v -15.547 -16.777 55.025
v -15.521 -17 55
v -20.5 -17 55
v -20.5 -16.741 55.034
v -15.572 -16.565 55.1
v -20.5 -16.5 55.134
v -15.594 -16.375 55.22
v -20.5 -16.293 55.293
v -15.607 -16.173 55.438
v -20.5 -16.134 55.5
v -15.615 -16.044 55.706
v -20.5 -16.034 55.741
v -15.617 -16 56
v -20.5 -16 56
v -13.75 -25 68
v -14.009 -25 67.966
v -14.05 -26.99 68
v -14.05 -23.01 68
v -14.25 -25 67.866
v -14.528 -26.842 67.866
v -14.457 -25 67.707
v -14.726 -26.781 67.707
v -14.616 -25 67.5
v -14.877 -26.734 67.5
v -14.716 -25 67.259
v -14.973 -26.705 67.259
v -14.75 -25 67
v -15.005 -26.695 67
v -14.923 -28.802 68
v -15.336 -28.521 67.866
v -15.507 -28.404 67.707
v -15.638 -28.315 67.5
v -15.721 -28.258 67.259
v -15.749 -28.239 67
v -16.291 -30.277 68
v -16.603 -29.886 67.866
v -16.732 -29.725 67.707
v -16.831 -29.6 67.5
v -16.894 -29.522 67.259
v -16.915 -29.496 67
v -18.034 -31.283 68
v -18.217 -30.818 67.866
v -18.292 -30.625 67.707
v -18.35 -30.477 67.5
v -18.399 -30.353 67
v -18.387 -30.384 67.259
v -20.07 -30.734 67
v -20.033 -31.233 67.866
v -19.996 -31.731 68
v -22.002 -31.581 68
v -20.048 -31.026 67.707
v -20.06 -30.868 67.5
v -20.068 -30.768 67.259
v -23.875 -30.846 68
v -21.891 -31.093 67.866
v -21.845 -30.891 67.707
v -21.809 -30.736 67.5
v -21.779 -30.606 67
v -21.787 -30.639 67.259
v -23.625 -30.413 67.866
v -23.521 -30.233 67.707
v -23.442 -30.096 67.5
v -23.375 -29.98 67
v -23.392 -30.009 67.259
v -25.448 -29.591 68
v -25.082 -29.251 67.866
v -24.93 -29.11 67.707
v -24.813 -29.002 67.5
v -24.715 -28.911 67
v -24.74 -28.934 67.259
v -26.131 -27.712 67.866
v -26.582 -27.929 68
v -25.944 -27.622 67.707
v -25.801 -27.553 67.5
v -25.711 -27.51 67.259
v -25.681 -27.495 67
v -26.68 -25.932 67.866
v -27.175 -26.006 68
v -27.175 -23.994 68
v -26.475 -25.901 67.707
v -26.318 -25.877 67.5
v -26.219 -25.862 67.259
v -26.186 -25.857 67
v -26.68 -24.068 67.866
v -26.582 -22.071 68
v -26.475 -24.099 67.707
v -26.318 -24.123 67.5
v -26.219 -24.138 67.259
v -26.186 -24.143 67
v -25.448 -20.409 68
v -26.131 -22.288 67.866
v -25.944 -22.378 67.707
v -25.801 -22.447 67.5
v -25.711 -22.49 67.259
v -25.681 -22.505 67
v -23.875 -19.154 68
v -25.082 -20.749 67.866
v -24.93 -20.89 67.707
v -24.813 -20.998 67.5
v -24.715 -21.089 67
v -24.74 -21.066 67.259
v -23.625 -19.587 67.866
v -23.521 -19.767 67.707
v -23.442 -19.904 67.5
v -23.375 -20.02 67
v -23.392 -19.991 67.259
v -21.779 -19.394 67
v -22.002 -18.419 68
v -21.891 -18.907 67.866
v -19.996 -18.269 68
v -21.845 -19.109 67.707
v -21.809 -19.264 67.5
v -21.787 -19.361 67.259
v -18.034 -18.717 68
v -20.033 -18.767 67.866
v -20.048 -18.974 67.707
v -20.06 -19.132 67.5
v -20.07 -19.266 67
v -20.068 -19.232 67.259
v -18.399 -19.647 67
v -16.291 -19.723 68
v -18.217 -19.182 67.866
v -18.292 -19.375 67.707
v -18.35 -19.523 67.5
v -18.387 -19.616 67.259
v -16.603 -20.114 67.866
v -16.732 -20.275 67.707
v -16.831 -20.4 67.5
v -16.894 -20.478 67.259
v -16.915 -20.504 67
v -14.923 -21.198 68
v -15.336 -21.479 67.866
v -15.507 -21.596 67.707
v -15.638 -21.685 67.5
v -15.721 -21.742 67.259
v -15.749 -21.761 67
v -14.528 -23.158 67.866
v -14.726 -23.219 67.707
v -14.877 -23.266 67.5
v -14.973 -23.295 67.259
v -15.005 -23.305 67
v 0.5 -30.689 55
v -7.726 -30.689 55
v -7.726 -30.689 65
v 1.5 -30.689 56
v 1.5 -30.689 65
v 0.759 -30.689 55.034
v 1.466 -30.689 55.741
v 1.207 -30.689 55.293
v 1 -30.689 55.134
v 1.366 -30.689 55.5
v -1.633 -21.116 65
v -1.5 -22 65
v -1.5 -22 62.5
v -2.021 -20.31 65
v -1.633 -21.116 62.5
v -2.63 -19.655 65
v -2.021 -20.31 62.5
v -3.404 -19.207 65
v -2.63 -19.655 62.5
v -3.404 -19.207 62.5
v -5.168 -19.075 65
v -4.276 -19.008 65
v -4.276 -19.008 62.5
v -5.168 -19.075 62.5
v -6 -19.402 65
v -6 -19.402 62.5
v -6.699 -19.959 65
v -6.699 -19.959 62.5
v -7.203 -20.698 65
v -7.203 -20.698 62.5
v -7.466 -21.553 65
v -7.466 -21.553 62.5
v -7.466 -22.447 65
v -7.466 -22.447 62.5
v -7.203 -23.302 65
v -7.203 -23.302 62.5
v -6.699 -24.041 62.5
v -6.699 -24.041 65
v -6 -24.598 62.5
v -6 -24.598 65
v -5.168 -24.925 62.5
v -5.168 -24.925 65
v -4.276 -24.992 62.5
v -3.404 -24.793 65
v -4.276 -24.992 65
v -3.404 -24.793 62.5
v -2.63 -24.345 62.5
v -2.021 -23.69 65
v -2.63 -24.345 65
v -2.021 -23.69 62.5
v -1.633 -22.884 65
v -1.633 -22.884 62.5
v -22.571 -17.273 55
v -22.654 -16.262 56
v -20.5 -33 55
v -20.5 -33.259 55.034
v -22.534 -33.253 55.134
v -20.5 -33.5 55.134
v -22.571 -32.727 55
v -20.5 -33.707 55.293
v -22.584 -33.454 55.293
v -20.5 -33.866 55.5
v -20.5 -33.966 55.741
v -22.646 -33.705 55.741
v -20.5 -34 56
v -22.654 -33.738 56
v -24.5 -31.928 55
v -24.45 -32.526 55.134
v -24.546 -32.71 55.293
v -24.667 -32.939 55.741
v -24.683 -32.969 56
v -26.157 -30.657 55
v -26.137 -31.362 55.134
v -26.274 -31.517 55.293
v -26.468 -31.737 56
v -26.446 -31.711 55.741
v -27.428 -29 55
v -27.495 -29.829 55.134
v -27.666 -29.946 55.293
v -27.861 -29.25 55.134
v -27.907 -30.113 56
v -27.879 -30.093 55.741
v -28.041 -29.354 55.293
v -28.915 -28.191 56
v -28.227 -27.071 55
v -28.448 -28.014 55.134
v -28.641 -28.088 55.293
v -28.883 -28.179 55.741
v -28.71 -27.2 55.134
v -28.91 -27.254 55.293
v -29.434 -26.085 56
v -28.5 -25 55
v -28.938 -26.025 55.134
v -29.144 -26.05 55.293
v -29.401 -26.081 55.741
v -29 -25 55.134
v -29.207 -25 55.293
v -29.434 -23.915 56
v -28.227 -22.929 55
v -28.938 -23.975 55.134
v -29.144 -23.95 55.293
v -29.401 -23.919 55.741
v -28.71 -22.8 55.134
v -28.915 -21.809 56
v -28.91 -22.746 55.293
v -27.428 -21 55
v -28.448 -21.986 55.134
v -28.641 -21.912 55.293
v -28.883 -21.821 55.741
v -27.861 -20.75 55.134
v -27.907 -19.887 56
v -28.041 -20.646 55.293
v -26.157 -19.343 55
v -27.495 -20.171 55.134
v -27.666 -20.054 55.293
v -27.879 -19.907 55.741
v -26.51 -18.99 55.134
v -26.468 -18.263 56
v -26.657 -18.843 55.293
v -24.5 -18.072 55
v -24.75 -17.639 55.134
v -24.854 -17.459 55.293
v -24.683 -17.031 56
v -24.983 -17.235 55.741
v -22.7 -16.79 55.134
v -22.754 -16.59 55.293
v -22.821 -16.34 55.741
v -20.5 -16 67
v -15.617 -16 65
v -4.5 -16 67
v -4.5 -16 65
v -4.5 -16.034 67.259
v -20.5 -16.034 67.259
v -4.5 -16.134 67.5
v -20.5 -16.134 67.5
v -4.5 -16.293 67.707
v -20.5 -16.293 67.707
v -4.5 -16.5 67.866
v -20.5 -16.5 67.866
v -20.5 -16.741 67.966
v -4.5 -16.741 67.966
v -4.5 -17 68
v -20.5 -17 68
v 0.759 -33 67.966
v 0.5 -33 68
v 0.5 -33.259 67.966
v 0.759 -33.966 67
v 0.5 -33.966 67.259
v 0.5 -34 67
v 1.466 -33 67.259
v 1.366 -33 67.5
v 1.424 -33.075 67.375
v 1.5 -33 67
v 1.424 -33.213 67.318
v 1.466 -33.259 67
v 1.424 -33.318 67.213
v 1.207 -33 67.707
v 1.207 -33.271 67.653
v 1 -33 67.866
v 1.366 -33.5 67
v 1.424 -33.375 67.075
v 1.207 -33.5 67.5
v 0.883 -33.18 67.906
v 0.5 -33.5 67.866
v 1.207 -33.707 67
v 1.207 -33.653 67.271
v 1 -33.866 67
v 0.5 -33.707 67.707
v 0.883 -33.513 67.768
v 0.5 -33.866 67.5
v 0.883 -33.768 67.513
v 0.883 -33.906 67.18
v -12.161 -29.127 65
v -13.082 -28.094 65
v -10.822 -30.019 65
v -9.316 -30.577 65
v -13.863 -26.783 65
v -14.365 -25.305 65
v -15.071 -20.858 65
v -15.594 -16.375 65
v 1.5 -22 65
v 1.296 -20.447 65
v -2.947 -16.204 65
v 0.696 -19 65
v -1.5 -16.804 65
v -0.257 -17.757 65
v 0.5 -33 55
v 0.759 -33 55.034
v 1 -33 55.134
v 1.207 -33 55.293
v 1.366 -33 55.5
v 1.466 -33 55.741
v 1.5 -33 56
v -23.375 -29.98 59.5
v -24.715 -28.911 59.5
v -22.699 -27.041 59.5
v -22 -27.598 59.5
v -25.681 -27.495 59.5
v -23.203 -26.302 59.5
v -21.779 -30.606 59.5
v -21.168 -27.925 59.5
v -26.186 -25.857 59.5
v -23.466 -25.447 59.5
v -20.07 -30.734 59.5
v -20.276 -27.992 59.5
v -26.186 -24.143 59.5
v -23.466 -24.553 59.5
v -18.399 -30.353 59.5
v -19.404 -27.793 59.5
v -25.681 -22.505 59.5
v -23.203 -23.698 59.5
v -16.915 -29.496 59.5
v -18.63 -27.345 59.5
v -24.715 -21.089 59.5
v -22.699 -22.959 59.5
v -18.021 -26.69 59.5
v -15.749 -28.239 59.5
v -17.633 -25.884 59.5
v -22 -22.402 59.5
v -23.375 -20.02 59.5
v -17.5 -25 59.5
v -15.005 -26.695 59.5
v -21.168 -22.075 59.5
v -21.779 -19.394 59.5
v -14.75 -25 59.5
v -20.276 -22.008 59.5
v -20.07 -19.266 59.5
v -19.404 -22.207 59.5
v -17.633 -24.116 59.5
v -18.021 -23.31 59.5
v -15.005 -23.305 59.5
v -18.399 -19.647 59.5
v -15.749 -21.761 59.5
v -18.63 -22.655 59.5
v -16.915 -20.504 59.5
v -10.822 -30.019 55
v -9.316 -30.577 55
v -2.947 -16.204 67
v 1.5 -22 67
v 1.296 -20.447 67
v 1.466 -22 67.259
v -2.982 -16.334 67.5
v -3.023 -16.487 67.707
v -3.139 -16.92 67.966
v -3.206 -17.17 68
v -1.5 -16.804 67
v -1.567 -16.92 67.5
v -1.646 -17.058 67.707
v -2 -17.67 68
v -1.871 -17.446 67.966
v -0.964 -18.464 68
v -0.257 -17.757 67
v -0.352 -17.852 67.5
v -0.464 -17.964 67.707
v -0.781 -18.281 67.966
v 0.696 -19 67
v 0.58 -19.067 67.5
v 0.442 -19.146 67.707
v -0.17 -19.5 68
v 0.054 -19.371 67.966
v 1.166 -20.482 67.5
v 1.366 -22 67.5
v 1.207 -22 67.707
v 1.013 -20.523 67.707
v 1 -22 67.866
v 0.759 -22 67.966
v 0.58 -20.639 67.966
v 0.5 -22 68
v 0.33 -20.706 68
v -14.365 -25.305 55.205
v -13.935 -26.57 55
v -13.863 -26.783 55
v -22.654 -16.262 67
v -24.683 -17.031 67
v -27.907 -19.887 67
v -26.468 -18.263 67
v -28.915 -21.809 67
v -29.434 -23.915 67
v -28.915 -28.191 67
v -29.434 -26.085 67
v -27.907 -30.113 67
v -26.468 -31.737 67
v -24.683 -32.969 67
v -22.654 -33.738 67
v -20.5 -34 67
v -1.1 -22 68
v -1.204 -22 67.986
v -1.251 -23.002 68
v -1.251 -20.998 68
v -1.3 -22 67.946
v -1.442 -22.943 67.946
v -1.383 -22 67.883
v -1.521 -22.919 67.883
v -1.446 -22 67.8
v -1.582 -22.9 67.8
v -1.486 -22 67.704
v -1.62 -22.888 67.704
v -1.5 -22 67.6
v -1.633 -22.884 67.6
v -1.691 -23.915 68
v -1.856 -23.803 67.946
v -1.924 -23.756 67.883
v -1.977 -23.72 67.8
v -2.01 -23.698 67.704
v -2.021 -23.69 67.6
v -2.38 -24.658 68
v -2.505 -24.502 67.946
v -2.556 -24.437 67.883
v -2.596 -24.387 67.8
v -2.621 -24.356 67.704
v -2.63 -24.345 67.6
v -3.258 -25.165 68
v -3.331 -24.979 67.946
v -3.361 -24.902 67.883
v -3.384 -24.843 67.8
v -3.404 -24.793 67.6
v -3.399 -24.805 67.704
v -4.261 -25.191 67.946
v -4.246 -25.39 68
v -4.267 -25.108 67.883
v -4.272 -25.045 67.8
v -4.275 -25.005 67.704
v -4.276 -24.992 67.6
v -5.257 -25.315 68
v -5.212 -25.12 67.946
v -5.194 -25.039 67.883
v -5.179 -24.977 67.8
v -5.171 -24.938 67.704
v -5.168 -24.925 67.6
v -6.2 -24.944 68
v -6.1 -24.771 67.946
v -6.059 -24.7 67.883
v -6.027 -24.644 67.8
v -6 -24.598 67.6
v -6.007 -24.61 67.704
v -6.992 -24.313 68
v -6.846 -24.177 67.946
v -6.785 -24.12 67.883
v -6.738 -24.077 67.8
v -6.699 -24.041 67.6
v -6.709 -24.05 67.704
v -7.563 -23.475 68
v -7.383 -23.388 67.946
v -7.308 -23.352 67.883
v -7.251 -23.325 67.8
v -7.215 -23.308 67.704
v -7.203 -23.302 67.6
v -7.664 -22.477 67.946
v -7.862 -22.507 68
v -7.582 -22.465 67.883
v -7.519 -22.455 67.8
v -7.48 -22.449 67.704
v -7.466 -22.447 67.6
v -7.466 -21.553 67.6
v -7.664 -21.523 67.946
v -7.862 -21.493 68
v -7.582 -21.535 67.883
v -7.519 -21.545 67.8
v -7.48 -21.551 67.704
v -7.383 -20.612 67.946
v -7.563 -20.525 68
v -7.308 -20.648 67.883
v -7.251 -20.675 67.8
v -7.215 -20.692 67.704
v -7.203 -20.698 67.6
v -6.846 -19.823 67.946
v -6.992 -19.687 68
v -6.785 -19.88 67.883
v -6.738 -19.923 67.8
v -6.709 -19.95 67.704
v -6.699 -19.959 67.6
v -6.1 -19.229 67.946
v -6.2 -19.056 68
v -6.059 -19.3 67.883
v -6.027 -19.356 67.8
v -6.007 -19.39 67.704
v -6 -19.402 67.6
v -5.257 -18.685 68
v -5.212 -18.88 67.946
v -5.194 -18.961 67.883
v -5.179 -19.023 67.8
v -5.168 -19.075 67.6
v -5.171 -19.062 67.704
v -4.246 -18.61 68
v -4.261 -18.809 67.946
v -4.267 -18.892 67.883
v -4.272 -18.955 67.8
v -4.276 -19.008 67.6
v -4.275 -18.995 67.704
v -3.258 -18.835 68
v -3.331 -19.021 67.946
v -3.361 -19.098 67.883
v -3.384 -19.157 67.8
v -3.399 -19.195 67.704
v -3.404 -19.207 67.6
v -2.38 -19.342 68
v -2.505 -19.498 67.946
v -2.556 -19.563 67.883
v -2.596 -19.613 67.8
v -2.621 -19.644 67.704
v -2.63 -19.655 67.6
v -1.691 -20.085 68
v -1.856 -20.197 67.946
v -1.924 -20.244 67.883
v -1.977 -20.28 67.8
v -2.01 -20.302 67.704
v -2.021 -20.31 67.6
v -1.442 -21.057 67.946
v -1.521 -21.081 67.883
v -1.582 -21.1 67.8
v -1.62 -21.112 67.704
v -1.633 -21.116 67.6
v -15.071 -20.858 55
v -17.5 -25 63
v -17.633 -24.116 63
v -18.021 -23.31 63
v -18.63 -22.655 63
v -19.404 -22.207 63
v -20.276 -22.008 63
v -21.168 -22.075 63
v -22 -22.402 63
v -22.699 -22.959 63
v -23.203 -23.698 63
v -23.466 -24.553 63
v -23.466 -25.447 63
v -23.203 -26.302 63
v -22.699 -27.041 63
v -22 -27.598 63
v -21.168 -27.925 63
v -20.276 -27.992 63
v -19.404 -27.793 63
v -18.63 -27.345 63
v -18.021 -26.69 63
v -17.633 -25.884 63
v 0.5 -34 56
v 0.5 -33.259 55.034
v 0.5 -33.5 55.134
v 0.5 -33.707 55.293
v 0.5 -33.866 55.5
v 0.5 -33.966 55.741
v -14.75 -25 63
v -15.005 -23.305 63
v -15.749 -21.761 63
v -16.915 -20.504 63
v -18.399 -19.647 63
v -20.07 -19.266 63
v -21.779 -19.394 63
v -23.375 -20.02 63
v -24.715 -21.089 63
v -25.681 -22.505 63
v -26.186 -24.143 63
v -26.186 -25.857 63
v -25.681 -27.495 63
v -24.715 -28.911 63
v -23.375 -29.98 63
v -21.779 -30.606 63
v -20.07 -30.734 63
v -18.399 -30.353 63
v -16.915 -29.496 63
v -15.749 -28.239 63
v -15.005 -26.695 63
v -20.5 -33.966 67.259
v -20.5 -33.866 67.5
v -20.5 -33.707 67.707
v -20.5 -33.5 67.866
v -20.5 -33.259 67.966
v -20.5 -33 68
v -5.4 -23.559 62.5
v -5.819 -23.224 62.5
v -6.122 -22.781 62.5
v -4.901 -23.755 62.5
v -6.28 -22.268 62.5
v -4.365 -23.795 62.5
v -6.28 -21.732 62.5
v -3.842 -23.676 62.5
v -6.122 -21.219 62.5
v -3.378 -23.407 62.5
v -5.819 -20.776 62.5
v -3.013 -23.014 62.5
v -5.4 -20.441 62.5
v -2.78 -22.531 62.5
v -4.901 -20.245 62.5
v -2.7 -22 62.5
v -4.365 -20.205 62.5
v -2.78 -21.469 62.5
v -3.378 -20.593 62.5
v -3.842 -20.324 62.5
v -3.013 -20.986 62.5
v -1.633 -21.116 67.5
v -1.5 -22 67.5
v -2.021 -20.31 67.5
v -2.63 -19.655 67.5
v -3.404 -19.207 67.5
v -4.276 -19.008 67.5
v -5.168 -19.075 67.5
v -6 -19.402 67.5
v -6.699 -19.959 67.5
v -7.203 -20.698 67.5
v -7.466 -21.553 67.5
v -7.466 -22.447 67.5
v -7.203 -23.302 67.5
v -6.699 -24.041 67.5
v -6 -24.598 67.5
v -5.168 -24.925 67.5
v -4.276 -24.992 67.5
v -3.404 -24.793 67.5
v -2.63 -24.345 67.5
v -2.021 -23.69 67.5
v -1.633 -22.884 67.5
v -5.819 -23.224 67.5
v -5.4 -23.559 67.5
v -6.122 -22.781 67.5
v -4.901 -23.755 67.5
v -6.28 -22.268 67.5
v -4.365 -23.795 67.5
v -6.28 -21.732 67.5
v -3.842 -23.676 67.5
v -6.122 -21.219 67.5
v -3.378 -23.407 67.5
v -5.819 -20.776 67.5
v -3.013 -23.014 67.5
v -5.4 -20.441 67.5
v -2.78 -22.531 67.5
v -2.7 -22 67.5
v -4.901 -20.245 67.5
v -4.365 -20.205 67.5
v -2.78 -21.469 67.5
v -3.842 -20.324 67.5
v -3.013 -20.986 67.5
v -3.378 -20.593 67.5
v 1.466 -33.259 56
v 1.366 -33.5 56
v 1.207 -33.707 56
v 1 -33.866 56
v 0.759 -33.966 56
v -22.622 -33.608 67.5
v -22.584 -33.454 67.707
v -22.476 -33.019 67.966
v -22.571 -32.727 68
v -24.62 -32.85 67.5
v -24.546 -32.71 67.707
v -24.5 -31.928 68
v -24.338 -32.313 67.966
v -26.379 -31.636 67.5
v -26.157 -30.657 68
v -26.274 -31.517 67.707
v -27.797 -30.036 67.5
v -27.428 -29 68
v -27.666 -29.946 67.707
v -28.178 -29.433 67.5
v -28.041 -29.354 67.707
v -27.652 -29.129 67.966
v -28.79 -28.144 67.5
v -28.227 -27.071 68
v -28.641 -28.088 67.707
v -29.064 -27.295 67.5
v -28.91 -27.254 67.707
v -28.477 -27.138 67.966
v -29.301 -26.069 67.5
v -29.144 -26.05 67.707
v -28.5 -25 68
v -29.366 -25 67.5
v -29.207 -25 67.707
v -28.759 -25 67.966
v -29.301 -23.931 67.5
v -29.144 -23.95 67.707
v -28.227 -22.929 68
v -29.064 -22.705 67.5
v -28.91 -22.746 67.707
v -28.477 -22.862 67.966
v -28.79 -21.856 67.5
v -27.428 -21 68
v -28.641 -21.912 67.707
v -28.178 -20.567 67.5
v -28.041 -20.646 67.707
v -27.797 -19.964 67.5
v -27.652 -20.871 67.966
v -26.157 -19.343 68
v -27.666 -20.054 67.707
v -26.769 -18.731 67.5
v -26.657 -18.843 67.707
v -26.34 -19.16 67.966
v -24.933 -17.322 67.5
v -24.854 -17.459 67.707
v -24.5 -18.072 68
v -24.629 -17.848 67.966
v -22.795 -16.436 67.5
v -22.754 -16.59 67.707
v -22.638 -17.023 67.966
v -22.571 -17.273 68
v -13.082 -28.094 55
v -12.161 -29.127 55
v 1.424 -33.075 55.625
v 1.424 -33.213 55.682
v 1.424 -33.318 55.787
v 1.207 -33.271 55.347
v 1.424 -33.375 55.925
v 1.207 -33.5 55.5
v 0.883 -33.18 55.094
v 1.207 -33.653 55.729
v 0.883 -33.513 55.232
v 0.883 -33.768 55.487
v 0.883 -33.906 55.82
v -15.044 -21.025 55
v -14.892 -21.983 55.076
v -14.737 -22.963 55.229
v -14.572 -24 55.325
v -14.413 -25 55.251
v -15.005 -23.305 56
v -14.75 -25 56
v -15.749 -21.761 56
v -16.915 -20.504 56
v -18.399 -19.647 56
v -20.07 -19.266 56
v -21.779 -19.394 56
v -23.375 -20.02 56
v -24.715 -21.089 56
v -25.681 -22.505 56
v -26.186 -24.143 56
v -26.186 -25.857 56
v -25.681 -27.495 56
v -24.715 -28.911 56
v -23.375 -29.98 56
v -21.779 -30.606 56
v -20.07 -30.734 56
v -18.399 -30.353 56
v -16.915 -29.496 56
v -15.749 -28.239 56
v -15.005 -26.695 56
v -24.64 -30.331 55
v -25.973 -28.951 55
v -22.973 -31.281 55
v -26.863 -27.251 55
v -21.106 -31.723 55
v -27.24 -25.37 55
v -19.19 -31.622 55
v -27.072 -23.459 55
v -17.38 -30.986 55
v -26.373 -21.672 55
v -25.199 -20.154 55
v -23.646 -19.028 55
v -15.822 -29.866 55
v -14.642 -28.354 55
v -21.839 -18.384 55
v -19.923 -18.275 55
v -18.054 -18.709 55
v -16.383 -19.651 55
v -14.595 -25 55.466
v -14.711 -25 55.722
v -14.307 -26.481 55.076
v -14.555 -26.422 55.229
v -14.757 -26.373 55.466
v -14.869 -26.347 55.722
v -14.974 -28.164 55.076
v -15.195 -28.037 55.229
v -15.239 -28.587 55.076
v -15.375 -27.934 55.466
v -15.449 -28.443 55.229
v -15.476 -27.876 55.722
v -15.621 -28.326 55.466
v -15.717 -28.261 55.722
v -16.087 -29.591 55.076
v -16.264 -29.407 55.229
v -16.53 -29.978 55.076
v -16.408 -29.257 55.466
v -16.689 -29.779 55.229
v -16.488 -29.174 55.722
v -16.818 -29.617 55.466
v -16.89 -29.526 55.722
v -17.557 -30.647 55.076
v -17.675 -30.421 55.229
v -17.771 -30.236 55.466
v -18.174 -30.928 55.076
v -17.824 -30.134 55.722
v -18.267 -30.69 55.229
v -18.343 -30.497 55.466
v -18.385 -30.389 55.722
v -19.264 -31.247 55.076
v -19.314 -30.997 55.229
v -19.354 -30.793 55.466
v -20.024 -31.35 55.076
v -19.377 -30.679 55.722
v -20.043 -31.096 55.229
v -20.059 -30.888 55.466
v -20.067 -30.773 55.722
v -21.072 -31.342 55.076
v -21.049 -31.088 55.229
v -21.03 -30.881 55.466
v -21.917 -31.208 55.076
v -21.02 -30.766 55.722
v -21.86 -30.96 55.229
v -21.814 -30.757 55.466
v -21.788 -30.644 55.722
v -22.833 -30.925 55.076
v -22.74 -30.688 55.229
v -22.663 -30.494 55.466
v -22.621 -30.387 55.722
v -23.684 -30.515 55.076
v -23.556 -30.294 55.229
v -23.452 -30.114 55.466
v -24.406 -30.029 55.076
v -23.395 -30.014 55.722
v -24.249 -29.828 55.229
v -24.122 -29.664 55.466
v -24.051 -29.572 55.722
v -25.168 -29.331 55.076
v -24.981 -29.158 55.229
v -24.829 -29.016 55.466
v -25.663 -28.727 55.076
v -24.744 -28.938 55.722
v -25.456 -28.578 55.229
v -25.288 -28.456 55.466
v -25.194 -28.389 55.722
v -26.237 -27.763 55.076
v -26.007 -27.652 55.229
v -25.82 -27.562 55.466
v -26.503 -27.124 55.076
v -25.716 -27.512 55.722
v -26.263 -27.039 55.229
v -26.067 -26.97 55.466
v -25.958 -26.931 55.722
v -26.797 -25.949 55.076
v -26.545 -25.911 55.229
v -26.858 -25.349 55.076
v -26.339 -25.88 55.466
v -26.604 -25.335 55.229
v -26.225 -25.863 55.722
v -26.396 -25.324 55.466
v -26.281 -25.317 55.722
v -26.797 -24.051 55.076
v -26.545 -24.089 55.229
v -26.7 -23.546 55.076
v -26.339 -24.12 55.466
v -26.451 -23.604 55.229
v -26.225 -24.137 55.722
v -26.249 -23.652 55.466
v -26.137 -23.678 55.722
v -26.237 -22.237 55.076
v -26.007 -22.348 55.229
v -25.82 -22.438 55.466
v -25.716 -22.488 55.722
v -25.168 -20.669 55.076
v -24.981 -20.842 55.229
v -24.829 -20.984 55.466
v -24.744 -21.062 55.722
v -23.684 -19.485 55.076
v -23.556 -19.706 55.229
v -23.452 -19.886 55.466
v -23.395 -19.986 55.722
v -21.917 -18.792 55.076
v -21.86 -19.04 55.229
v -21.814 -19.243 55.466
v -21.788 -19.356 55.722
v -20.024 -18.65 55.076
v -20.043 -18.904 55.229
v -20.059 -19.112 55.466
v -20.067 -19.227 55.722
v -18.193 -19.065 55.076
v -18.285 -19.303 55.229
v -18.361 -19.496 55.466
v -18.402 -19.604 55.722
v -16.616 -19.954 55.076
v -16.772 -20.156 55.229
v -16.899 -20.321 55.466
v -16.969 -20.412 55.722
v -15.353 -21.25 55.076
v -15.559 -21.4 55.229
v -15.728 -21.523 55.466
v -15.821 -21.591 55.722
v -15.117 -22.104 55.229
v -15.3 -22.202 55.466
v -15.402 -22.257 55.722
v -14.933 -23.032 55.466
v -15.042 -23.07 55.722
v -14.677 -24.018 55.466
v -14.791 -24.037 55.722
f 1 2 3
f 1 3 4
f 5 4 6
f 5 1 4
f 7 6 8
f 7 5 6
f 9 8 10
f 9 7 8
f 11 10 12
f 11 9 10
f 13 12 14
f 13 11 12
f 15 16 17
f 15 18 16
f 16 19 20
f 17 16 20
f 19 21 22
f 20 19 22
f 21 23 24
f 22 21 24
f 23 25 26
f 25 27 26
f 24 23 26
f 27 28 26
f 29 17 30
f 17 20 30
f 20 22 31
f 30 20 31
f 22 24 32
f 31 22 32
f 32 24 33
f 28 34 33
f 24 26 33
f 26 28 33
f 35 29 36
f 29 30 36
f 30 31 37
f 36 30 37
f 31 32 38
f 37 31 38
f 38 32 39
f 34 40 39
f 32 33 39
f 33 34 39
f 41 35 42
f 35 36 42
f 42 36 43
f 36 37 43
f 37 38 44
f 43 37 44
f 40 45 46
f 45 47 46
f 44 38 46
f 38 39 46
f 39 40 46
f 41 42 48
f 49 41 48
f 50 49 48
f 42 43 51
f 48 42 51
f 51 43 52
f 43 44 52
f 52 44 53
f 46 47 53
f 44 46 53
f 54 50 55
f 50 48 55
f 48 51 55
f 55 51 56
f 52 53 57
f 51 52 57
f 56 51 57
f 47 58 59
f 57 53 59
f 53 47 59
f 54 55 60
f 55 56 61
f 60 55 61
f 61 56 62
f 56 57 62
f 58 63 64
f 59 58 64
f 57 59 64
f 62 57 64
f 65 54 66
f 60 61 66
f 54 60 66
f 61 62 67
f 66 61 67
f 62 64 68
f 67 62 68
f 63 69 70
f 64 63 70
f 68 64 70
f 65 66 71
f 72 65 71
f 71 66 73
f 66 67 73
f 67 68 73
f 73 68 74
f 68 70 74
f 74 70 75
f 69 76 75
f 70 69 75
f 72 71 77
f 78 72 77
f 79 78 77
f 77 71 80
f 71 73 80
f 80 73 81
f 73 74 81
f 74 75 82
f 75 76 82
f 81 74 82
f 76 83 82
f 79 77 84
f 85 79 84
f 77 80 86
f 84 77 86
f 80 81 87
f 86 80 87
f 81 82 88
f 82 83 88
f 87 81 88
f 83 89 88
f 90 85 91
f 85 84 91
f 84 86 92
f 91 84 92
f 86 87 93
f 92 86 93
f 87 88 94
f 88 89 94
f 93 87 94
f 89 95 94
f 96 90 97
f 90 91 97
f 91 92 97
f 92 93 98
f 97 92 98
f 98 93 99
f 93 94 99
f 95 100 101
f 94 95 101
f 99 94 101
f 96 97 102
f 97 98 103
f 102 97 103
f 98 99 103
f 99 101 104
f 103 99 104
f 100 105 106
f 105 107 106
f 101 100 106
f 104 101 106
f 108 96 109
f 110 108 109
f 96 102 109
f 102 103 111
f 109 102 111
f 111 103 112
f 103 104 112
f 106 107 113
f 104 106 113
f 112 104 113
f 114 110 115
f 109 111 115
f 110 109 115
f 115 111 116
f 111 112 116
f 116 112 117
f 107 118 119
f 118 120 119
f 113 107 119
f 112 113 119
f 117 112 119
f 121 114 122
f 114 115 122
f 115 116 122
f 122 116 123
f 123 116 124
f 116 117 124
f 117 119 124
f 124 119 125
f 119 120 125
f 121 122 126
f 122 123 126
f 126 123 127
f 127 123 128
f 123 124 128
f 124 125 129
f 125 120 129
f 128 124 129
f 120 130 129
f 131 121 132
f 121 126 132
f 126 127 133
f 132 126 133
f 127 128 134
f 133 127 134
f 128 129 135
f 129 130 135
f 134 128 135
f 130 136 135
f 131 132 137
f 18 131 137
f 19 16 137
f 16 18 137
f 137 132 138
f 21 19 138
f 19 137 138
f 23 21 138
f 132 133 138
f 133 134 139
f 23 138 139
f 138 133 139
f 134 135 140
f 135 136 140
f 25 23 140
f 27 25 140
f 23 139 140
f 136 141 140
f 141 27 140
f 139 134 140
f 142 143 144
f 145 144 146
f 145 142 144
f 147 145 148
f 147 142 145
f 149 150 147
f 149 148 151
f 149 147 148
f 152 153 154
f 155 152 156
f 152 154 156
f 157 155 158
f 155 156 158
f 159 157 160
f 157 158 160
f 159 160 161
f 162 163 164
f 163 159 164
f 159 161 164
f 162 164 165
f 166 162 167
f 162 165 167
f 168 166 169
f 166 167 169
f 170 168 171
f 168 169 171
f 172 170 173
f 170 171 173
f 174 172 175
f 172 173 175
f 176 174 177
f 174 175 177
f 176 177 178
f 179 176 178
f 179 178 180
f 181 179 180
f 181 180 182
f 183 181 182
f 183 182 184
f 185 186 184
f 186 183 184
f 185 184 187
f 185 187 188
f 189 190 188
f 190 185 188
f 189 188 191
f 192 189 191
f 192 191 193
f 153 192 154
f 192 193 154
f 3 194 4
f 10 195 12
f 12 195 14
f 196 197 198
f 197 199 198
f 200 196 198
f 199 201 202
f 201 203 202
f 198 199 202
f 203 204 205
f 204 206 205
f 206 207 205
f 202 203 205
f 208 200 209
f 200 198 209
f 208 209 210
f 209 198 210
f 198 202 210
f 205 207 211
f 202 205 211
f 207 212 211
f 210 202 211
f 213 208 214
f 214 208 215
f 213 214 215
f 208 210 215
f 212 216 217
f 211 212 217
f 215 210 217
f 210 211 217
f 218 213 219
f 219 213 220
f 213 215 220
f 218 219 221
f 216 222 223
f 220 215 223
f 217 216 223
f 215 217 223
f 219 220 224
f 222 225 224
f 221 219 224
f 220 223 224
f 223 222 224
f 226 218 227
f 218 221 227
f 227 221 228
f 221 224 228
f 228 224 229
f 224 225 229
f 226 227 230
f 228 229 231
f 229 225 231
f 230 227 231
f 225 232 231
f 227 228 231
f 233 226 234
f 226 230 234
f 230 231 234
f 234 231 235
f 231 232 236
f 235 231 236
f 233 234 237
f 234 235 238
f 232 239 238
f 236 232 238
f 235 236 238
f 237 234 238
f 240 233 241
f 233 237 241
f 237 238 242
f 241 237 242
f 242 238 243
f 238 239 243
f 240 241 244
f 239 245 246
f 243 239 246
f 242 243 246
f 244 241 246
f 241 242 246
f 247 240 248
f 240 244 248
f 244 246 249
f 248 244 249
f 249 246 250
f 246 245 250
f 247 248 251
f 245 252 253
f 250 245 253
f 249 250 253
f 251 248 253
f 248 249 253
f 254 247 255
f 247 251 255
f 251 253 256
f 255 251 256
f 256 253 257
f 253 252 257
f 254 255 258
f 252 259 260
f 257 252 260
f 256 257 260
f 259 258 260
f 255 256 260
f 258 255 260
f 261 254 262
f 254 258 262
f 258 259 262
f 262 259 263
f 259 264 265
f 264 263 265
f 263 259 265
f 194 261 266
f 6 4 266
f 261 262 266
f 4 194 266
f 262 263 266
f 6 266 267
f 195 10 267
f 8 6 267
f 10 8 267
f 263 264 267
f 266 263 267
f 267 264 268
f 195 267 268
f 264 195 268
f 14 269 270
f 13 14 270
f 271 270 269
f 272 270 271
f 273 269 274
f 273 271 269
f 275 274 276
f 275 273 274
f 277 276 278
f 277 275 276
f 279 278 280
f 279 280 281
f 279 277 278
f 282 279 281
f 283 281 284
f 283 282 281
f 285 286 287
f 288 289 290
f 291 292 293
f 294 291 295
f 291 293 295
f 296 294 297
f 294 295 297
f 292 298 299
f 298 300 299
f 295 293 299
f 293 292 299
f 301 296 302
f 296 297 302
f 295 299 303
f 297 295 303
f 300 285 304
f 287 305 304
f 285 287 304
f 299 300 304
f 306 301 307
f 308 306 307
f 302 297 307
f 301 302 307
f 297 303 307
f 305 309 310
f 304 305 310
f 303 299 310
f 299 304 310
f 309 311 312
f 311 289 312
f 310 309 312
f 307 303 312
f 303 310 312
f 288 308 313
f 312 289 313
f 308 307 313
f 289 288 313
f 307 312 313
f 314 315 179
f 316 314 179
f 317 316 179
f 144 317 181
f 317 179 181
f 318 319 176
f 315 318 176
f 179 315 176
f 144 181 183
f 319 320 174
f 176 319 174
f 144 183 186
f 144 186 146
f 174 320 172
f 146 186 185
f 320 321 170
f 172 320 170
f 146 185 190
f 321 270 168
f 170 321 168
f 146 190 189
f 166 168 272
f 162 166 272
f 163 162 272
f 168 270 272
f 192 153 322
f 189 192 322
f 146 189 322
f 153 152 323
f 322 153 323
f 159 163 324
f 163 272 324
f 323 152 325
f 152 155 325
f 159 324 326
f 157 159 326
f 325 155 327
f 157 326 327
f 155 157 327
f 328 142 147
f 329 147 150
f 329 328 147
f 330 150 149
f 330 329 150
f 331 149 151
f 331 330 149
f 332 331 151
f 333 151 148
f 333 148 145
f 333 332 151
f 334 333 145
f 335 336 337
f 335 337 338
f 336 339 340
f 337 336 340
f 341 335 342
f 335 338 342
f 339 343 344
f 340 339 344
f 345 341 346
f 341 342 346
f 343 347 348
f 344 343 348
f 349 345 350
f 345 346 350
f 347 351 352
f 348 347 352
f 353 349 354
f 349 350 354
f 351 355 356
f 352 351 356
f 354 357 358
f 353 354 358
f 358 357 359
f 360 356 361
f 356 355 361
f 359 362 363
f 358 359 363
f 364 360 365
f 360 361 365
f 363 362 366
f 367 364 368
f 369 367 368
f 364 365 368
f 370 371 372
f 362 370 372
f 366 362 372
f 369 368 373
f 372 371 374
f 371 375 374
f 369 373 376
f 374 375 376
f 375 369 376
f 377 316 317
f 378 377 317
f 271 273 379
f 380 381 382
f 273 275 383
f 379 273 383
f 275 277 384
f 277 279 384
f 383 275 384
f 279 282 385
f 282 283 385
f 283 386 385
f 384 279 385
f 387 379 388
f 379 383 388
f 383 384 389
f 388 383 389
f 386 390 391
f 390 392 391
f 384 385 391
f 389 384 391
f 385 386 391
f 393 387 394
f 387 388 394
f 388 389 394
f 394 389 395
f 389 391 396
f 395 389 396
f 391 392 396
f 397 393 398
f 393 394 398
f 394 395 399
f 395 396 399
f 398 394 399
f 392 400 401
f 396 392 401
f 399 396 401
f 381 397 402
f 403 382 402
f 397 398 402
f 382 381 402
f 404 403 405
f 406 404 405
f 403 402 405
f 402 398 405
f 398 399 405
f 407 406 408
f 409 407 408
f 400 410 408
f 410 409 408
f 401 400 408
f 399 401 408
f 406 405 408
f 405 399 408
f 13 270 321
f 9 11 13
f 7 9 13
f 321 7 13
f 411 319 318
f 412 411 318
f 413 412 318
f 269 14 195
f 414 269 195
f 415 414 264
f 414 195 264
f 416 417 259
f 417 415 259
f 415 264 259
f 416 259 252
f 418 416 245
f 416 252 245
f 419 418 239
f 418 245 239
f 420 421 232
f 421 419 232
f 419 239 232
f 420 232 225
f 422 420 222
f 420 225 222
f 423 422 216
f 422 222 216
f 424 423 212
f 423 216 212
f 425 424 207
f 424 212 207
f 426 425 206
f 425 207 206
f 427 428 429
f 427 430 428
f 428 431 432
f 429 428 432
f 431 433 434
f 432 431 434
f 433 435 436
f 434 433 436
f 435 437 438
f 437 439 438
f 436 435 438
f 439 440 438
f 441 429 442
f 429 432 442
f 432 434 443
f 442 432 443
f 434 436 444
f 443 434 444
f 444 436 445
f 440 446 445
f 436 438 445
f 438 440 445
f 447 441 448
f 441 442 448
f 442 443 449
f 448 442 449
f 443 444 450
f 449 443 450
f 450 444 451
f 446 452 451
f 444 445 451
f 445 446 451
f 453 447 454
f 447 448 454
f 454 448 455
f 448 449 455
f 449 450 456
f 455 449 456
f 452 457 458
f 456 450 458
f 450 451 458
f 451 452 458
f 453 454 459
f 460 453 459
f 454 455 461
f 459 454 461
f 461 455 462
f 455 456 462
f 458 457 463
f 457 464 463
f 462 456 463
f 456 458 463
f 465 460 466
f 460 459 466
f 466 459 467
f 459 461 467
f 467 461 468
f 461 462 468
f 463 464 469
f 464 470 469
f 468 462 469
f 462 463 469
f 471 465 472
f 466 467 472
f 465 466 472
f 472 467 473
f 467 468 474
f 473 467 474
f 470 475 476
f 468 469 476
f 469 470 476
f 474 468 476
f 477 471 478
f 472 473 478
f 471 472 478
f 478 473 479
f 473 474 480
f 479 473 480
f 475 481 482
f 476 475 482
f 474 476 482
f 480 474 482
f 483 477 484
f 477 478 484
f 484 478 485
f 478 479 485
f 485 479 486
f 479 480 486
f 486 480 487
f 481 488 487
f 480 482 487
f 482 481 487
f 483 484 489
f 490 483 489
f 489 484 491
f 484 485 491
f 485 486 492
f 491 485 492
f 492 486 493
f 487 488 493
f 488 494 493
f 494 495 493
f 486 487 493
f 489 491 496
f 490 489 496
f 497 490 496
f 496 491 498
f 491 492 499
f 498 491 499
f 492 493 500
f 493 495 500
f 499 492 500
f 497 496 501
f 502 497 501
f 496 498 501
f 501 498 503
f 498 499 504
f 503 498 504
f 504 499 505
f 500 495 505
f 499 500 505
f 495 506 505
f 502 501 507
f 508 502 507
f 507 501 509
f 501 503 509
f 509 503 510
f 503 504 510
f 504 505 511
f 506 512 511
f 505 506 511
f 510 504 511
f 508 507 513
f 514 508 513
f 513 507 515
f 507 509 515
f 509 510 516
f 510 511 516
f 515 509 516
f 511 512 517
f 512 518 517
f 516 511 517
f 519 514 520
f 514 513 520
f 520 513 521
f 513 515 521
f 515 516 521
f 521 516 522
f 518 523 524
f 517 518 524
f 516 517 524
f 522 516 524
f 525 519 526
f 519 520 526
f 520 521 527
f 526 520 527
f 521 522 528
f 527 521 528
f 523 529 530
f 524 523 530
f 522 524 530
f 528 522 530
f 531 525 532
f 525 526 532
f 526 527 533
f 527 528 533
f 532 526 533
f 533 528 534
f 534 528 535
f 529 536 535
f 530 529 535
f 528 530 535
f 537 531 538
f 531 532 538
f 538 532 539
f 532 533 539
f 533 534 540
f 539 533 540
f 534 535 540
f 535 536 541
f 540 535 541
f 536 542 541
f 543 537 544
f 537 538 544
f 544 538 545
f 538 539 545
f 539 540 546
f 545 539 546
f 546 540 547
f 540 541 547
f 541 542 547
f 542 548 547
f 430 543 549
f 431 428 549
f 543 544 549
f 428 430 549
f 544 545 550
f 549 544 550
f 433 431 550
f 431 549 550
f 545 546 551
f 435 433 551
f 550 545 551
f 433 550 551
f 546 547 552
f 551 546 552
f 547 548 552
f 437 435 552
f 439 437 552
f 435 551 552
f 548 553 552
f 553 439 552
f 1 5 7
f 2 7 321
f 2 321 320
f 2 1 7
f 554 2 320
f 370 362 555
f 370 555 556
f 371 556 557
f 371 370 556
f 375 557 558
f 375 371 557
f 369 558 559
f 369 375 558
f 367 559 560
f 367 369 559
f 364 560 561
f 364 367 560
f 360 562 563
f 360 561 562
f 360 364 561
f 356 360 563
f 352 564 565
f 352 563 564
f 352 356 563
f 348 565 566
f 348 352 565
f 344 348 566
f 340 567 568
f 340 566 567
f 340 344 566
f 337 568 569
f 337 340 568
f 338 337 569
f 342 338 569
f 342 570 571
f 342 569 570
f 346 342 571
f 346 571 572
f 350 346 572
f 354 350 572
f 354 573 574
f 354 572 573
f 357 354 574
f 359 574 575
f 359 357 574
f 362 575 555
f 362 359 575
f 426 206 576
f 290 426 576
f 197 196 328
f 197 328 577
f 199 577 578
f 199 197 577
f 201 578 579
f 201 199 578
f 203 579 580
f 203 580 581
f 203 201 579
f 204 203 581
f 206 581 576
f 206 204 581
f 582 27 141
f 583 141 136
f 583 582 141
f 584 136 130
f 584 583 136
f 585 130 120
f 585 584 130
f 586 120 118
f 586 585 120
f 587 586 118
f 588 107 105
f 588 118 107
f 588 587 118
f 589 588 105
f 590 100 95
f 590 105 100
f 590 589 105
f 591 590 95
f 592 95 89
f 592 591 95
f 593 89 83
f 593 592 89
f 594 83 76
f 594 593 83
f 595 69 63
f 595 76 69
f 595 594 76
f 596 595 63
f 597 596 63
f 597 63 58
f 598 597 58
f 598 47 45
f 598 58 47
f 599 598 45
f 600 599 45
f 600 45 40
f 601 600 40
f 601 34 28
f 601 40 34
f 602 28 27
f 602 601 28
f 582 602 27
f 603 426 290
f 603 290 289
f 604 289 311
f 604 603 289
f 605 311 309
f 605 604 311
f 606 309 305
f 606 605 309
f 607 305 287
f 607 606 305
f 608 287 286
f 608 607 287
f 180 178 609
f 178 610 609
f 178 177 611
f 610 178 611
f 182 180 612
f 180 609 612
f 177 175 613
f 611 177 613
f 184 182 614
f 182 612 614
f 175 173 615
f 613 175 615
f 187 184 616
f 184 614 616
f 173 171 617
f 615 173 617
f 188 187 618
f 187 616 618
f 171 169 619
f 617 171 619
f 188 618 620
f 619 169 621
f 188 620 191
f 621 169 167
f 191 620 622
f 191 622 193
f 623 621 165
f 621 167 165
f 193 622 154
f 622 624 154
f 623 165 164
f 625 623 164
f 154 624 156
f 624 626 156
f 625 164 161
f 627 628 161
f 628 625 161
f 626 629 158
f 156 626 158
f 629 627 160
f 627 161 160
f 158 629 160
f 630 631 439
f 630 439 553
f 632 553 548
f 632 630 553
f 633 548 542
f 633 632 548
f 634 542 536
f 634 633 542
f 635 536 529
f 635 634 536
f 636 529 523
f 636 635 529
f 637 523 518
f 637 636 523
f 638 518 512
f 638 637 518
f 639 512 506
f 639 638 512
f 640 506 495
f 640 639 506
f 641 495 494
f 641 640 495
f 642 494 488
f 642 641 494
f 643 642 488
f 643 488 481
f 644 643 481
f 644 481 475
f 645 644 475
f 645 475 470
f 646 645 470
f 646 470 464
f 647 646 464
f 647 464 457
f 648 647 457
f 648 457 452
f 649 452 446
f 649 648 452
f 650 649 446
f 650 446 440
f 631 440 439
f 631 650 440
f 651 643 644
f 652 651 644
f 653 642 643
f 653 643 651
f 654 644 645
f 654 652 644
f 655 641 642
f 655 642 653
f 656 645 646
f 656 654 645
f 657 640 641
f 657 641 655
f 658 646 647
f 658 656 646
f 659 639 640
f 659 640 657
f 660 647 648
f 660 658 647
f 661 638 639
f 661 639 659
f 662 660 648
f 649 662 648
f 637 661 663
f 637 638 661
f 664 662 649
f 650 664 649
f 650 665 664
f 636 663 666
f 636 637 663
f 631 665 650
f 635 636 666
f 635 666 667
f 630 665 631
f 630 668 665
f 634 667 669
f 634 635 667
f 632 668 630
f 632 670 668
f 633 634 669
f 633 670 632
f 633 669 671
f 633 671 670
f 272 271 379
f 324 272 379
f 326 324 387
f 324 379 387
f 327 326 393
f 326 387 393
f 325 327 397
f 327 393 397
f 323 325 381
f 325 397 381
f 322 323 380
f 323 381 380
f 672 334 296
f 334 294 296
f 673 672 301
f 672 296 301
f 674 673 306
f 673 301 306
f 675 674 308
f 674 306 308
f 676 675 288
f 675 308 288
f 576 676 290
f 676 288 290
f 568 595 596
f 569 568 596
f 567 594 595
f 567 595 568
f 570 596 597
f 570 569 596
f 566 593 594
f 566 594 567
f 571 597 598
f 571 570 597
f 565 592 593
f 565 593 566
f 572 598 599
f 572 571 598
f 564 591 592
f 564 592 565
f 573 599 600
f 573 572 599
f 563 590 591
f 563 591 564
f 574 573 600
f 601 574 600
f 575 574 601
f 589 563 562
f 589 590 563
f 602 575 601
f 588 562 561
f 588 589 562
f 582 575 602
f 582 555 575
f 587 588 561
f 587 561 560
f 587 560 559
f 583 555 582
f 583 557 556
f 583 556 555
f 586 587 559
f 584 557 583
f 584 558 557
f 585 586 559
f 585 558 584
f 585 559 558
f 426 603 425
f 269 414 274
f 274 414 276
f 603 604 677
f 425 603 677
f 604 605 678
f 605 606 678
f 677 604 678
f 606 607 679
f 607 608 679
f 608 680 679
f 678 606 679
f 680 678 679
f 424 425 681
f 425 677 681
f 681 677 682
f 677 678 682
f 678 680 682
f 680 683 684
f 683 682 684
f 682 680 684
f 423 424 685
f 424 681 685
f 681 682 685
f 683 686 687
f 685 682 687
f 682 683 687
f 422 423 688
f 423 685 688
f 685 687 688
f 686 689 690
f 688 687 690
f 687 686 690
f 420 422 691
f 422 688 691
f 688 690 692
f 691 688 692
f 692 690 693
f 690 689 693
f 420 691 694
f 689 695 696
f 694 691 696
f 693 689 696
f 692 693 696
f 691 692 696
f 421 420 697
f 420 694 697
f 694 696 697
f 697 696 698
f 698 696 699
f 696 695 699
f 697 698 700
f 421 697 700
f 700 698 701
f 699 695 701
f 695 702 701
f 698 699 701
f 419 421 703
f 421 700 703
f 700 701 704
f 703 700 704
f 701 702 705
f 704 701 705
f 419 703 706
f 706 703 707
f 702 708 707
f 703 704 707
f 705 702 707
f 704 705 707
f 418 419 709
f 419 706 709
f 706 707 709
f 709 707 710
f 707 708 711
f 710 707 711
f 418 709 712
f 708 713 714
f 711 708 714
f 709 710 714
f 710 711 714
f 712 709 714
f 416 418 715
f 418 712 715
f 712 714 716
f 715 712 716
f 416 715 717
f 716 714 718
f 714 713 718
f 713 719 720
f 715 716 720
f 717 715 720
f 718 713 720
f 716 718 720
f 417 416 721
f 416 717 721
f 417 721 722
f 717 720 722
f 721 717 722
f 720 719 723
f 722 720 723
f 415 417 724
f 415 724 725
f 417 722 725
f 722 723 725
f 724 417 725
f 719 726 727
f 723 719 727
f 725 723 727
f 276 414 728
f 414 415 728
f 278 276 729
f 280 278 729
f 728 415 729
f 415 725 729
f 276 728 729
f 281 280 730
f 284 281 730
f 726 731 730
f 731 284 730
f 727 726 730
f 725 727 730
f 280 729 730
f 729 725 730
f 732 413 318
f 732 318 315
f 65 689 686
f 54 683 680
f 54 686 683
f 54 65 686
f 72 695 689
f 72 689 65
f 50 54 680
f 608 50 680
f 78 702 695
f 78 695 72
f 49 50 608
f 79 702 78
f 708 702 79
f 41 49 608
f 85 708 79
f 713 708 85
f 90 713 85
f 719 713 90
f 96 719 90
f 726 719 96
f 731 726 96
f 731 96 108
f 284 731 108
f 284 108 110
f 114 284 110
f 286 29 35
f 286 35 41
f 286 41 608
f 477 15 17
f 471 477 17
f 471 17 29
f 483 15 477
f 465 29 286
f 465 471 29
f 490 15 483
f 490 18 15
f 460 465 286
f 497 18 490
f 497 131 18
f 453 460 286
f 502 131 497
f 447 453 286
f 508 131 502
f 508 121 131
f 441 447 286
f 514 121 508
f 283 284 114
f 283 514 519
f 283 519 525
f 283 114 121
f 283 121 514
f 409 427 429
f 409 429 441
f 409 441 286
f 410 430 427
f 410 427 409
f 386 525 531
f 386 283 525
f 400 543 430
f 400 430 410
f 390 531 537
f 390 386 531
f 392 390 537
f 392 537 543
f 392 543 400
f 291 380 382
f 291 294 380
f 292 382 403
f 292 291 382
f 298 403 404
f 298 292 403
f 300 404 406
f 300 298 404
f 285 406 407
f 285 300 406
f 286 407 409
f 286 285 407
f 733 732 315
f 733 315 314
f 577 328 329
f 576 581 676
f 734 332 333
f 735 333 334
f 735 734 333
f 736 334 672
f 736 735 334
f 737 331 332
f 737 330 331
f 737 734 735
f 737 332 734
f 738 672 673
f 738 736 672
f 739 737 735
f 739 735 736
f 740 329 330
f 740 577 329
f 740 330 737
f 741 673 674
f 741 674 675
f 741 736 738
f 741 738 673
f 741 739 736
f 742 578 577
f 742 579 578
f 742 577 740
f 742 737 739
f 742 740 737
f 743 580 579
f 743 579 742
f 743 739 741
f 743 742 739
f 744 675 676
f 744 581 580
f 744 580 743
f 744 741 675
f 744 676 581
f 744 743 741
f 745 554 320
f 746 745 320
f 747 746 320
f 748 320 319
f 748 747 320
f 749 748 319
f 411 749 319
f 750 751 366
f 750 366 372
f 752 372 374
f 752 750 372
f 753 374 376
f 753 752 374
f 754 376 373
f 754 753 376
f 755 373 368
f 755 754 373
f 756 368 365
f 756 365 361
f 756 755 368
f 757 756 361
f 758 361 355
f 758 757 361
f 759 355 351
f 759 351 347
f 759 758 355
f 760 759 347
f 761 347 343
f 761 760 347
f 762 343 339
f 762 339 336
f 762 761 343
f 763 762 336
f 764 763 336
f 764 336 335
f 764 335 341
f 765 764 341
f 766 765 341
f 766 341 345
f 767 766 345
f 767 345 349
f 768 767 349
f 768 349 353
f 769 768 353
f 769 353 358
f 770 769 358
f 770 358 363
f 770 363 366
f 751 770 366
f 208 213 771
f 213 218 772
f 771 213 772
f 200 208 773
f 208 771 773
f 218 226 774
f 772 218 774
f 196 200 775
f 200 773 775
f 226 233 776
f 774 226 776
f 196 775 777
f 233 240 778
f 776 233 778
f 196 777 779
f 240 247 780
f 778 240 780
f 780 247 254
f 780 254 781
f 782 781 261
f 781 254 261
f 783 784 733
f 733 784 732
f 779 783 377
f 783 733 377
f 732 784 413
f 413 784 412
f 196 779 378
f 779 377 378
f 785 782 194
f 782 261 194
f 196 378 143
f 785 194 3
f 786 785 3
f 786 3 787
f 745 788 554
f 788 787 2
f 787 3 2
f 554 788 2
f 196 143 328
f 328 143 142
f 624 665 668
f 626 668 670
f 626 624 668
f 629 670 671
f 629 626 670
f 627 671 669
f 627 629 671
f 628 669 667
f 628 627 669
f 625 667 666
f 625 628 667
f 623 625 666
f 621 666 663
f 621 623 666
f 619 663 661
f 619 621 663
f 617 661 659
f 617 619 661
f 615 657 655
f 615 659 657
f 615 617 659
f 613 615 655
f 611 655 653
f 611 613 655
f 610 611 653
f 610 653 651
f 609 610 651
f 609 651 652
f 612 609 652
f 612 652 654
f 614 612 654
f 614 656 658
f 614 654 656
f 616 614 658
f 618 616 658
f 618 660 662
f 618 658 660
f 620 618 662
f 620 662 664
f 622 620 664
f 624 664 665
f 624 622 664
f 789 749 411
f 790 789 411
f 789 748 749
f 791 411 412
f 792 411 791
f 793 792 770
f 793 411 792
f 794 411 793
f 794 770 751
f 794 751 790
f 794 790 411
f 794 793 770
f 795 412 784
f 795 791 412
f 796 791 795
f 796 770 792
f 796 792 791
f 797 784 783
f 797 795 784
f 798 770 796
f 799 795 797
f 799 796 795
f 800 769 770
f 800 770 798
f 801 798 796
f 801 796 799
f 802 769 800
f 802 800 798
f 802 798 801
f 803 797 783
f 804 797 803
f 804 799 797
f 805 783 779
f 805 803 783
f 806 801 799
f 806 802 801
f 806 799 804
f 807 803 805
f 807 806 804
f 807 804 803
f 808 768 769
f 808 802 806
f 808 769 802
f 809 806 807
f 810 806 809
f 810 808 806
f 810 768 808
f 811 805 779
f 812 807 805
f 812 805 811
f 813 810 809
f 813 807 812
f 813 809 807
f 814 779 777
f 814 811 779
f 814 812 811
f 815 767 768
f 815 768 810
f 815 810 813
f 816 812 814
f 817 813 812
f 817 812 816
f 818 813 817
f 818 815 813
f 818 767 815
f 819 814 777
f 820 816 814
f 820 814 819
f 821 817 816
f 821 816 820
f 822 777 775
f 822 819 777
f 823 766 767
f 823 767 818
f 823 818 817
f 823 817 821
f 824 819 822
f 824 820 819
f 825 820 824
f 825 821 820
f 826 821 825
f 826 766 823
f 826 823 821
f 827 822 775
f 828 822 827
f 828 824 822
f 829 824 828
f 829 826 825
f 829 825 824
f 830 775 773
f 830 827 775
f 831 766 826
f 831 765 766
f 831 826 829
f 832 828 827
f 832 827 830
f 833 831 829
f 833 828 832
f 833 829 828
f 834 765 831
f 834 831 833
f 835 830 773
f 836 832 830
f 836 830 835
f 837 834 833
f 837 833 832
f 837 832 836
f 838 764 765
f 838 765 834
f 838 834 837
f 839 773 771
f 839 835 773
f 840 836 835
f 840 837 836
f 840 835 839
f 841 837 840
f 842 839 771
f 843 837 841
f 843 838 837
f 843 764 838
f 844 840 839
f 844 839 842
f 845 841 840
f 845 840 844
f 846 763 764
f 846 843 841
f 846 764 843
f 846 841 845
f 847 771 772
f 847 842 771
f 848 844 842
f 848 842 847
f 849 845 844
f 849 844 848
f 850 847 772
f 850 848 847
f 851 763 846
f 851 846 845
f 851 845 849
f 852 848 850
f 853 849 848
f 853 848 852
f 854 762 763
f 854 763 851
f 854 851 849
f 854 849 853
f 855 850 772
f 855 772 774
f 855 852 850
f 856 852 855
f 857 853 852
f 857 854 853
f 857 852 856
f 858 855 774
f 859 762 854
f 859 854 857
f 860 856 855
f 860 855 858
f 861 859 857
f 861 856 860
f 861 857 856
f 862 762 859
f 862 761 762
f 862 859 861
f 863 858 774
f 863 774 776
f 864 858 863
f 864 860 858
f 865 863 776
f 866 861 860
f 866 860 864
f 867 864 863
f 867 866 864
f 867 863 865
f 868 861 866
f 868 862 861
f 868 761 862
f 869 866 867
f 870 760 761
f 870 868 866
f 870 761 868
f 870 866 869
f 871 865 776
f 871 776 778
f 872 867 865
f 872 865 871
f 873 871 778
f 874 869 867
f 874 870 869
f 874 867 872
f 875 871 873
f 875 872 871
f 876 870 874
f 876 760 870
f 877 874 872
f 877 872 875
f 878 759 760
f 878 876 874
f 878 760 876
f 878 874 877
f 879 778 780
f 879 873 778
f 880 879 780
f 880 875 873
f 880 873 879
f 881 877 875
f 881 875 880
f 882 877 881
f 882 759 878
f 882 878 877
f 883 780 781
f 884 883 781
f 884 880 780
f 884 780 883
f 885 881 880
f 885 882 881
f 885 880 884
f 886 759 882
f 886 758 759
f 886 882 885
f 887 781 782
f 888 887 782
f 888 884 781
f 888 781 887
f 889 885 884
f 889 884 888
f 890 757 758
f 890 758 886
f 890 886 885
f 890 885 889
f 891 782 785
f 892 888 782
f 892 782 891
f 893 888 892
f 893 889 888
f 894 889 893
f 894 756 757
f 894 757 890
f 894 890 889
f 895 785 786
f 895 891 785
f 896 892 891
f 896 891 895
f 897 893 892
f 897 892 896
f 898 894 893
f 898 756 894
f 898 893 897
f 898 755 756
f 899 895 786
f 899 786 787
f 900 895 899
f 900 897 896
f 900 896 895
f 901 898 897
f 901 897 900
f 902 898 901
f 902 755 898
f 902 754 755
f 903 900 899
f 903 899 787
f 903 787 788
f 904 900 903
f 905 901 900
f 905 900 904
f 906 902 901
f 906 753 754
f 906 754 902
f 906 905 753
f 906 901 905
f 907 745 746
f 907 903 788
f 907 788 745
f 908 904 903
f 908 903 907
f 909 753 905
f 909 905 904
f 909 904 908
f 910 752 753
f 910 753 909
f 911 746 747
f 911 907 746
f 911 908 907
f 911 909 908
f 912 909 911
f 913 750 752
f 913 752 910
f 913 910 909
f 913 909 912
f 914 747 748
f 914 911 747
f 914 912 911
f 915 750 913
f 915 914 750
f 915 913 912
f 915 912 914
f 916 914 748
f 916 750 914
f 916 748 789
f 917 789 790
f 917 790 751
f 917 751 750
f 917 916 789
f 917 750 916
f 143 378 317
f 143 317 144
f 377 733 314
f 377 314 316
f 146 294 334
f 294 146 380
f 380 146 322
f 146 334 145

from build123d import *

# Parameters (mm, degrees)
CYLINDER020_R     = 1.8
CYLINDER020_DEPTH = 7
CYLINDER021_R     = 3
CYLINDER021_DEPTH = 7
PAD_DEPTH         = 30
BOX002_W          = 10
BOX002_H          = 10
BOX002_DEPTH      = 10
BOX003_W          = 17
BOX003_H          = 10
BOX003_DEPTH      = 10
CYLINDER018_R     = 5.75
CYLINDER018_DEPTH = 10
CYLINDER017_R     = 3
CYLINDER017_DEPTH = 10
CYLINDER016_R     = 5.75
CYLINDER016_DEPTH = 10
CYLINDER015_R     = 3
CYLINDER015_DEPTH = 10
BOX_W             = 22
BOX_H             = 18
BOX_DEPTH         = 13
CYLINDER_R        = 9
CYLINDER_DEPTH    = 13
FILLET_R          = 6
FILLET001_R       = 1
FILLET002_R       = 1
FILLET003_R       = 1
CYLINDER019_R     = 3
CYLINDER019_DEPTH = 3
FILLET004_R       = 0.4


with BuildPart() as m3cut:
    # Cylinder020 → Cylinder020 (new body)
    with BuildSketch(Plane(origin=(-4.5, -22, 62.5), x_dir=(1, 0, 0), z_dir=(0, 0, 1))):
        Circle(CYLINDER020_R)
    extrude(amount=CYLINDER020_DEPTH)


with BuildPart() as fusion009:
    # Cylinder021 → Cylinder021 (new body)
    with BuildSketch(Plane(origin=(-4.5, -22, 67.5), x_dir=(1, 0, 0), z_dir=(0, 0, 1))):
        Circle(CYLINDER021_R)
    extrude(amount=CYLINDER021_DEPTH)

    # Fusion009: union m3Cut
    add(m3cut.part)


with BuildPart() as body:
    # Sketch → Pad (new body)
    with BuildSketch(Plane.XY):
        Polygon((-15.594093, -16.374565), (-15.071085, -20.857502), (-14.364655, -25.305099), (-13.862565, -26.78348), (-13.081532, -28.094496), (-12.161032, -29.126572), (-10.822123, -30.019178), (-9.315848, -30.577057), (-7.725893, -30.688633), (7.476312, -30.688633), (-15.876865, 6.281797), (-15.876865, -11.843776), align=None)
    extrude(amount=PAD_DEPTH)

    # Box002 → Box002 (join)
    with BuildSketch(Plane.XY):
        with Locations((5, 5)):
            Rectangle(BOX002_W, BOX002_H)
    extrude(amount=BOX002_DEPTH)


with BuildPart() as body_1:
    # Body placement: moved
    add(body.part.moved(Location((0, 0, 35))))


with BuildPart() as firstcuts:
    # Box003 → Box003 (new body)
    with BuildSketch(Plane(origin=(-10, -24, 55), x_dir=(1, 0, 0), z_dir=(0, 0, 1))):
        with Locations((8.5, 5)):
            Rectangle(BOX003_W, BOX003_H)
    extrude(amount=BOX003_DEPTH)

    # Fusion007: union Body
    add(body_1.part)


with BuildPart() as antennain005:
    # Cylinder018 → Cylinder018 (new body)
    with BuildSketch(Plane(origin=(-23, 0, 69), x_dir=(1, 0, 0), z_dir=(0, 0, 1))):
        Circle(CYLINDER018_R)
    extrude(amount=CYLINDER018_DEPTH)


with BuildPart() as fusion005:
    # Cylinder017 → Cylinder017 (new body)
    with BuildSketch(Plane(origin=(-23, 0, 65), x_dir=(1, 0, 0), z_dir=(0, 0, 1))):
        Circle(CYLINDER017_R)
    extrude(amount=CYLINDER017_DEPTH)

    # Fusion005: union antennaIn005
    add(antennain005.part)


with BuildPart() as fusion005_1:
    # Fusion005 placement: moved
    add(fusion005.part.moved(Location((2.5, -25, -19.5))))


with BuildPart() as antennain003:
    # Cylinder016 → Cylinder016 (new body)
    with BuildSketch(Plane(origin=(-23, 0, 69), x_dir=(1, 0, 0), z_dir=(0, 0, 1))):
        Circle(CYLINDER016_R)
    extrude(amount=CYLINDER016_DEPTH)


with BuildPart() as antennacuts:
    # Cylinder015 → Cylinder015 (new body)
    with BuildSketch(Plane(origin=(-23, 0, 65), x_dir=(1, 0, 0), z_dir=(0, 0, 1))):
        Circle(CYLINDER015_R)
    extrude(amount=CYLINDER015_DEPTH)

    # Fusion004: union antennaIn003
    add(antennain003.part)


with BuildPart() as antennacuts_1:
    # Fusion004 placement: moved
    add(antennacuts.part.moved(Location((2.5, -25, -6))))

    # Fusion006: union Fusion005
    add(fusion005_1.part)


with BuildPart() as cube:
    # Box → Box (new body)
    with BuildSketch(Plane(origin=(-20.5, -34, 56), x_dir=(1, 0, 0), z_dir=(0, 0, 1))):
        with Locations((11, 9)):
            Rectangle(BOX_W, BOX_H)
    extrude(amount=BOX_DEPTH)


with BuildPart() as cut001:
    # Cylinder → Cylinder (new body)
    with BuildSketch(Plane(origin=(-20.5, -25, 56), x_dir=(1, 0, 0), z_dir=(0, 0, 1))):
        Circle(CYLINDER_R)
    extrude(amount=CYLINDER_DEPTH)

    # Fusion: union Cube
    add(cube.part)


with BuildPart() as cut001_1:
    # Fusion placement: moved
    add(cut001.part.moved(Location((0, 0, -1))))

    # Fillet
    fillet_edges = [cut001_1.edges().sort_by_distance(p)[0] for p in [
        (1.5, -16, 61.5),
    ]]
    fillet(fillet_edges, radius=FILLET_R)

    # Fillet001
    fillet001_edges = [cut001_1.edges().sort_by_distance(p)[0] for p in [
        (-12.5, -16, 55),
        (-9.5, -34, 55),
        (1.5, -28, 55),
        (-12.5, -16, 68),
        (1.5, -28, 68),
        (1.5, -34, 61.5),
        (-9.5, -34, 68),
        (-29.5, -25, 55),
        (-29.5, -25, 68),
    ]]
    fillet(fillet001_edges, radius=FILLET001_R)

    # Cut: cut antennaCuts
    add(antennacuts_1.part, mode=Mode.SUBTRACT)

    # Fillet002
    fillet002_edges = [cut001_1.edges().sort_by_distance(p)[0] for p in [
        (-16.434136, -29.065864, 68),
        (-16.434136, -20.934136, 68),
    ]]
    fillet(fillet002_edges, radius=FILLET002_R)

    # Fillet003
    fillet003_edges = [cut001_1.edges().sort_by_distance(p)[0] for p in [
        (-16.434136, -29.065864, 55),
        (-16.434136, -20.934136, 55),
        (-26.25, -25, 55),
    ]]
    fillet(fillet003_edges, radius=FILLET003_R)

    # Cut001: cut firstCuts
    add(firstcuts.part, mode=Mode.SUBTRACT)


with BuildPart() as fillet004:
    # Cylinder019 → Cylinder019 (new body)
    with BuildSketch(Plane(origin=(-4.5, -22, 62.5), x_dir=(1, 0, 0), z_dir=(0, 0, 1))):
        Circle(CYLINDER019_R)
    extrude(amount=CYLINDER019_DEPTH)

    # Fusion008: union Cut001
    add(cut001_1.part)

    # Cut002: cut Fusion009
    add(fusion009.part, mode=Mode.SUBTRACT)

    # Fillet004
    fillet004_edges = [fillet004.edges().sort_by_distance(p)[0] for p in [
        (-7.5, -22, 68),
    ]]
    fillet(fillet004_edges, radius=FILLET004_R)


solid = fillet004.part
